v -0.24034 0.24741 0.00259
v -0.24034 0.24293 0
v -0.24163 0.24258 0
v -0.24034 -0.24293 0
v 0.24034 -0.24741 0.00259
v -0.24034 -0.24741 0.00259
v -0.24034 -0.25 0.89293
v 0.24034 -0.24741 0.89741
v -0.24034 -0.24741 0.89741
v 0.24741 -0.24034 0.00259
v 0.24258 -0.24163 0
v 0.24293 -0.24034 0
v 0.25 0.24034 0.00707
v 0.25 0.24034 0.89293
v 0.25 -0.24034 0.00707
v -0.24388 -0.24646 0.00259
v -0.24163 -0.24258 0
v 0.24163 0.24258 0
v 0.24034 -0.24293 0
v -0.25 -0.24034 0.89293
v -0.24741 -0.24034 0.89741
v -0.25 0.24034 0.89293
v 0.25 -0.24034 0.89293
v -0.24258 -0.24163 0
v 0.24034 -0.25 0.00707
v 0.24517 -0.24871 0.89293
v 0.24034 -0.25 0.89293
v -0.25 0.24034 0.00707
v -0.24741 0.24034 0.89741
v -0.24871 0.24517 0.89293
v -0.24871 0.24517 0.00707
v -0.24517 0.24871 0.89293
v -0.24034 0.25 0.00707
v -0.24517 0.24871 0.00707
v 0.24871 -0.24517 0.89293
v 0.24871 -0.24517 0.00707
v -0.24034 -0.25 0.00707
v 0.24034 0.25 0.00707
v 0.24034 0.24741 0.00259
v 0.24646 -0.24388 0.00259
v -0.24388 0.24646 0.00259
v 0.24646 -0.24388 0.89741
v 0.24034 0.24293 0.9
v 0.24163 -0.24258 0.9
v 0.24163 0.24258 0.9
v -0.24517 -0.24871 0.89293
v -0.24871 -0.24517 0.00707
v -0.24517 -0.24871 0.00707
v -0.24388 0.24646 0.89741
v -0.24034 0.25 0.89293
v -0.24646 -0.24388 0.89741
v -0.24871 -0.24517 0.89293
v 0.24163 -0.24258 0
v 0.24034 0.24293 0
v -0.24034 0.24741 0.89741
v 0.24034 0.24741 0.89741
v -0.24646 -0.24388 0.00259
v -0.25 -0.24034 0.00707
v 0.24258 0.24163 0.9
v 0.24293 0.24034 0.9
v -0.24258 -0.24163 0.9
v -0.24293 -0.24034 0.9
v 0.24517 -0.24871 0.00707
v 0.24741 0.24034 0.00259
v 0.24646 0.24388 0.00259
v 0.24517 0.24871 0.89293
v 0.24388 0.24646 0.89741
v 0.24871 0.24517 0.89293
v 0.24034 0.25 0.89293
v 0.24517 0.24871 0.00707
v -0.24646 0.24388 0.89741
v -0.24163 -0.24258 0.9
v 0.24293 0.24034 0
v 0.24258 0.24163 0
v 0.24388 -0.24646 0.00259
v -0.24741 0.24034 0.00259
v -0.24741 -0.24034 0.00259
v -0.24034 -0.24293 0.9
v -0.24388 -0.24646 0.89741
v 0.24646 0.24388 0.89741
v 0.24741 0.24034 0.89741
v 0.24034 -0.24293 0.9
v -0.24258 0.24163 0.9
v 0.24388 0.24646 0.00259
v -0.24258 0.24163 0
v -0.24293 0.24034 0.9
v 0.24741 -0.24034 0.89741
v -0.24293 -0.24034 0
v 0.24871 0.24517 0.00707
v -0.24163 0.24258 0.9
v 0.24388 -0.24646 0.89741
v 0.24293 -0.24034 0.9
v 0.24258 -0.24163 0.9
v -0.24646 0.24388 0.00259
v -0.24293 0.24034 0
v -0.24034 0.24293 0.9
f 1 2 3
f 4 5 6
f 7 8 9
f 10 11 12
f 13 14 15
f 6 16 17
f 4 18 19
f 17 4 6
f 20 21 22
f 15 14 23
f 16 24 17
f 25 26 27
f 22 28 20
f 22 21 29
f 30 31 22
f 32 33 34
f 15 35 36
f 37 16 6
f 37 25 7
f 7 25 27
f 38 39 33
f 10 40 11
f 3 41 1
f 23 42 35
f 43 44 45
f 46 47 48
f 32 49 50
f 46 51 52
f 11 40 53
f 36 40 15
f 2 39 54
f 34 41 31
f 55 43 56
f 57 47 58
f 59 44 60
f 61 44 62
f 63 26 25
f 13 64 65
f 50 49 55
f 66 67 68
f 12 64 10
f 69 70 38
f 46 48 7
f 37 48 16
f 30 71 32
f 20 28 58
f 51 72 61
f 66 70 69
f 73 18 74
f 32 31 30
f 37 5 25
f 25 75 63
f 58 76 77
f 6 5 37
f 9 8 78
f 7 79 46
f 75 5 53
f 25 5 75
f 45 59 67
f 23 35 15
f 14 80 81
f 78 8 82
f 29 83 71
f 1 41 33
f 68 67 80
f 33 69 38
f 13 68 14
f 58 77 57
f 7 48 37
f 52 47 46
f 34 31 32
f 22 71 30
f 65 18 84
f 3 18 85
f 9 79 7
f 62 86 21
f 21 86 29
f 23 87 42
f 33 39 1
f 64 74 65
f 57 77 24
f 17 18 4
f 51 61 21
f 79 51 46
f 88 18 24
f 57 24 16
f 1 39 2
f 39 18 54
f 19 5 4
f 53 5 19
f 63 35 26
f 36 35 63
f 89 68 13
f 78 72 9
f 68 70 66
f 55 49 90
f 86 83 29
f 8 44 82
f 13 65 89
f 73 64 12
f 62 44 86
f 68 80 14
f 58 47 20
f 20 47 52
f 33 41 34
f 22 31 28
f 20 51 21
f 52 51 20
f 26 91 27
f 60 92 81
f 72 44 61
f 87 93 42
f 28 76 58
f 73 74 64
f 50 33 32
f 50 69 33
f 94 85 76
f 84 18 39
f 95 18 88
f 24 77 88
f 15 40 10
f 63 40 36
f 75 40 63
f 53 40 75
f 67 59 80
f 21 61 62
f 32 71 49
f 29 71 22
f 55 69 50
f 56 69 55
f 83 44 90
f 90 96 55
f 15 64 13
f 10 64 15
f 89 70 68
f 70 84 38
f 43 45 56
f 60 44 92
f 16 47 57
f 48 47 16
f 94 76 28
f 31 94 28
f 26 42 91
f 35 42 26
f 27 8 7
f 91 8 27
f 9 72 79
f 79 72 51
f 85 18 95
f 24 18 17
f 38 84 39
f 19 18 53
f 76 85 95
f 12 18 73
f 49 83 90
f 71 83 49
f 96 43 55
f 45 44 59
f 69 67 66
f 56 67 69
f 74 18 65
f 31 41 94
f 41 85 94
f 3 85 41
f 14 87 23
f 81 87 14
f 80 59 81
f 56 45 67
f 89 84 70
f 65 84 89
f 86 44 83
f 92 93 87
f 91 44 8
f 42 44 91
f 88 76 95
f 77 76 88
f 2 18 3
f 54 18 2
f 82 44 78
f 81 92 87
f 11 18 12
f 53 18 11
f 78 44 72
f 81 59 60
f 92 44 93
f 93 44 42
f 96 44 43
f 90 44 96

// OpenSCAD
// file: lib.scad
function x(v) = v[0];
function y(v) = v[1];
function z(v) = v[2];
function add(v1,v2) = [ for (i = [ 0 : len(v1)-1 ]) v1[i] + v2[i] ];
function xv(d) = [d,0,0];
function yv(d) = [0,d,0];
function zv(d) = [0,0,d];

module box(v) { cube(size=v, center=true); }
module cyl(r1,r2,h) { cylinder(r1=r1, r2=r2, h=h, center=true); }

function grow(n,v) = [x(v)+n*2, y(v)+n*2, z(v)+n*2];

module rbox(v, radius=1) {
	cx = x(v)/2-radius;
	cy = y(v)/2-radius;
	cz = z(v)/2-radius;

	hull() {
		translate([cx,cy,cz]) sphere(r=radius);
		translate([cx,cy,-cz]) sphere(r=radius);
		translate([cx,-cy,cz]) sphere(r=radius);
		translate([cx,-cy,-cz]) sphere(r=radius);
		translate([-cx,cy,cz]) sphere(r=radius);
		translate([-cx,cy,-cz]) sphere(r=radius);
		translate([-cx,-cy,cz]) sphere(r=radius);
		translate([-cx,-cy,-cz]) sphere(r=radius);
	}
}

module fillet(r=1) {
  minkowski() {
    difference() {
      children();
      minkowski() {
        difference() {
          minkowski() {
            children();
            sphere(r=r);
          }
          children();
        }
        sphere(r=r);
      }
    }
    sphere(r=r);
  }
}
// main file
use <lib.scad>

module base() {
	difference() {
		translate([0,0,1.0-0.05]) box([1.0, 1.0, 0.1]);
		translate([0,0,1.0]) box([0.9, 1.1, 0.1]);
	}
}

module pillar() {
	translate([0,0,0.45]) box([0.5, 0.5, 0.9]);
}

module belt() {
	translate([0,0,0.995]) box([0.85, 1.0, 0.01]);
}

module ridge() {
	translate([0,0.5,1.005]) box([0.8, 0.01, 0.01]);
}

//fillet(0.01, $fn=12) base();
//base();
fillet(0.01, $fn=12) pillar();
//pillar();
//belt();
//ridge();
